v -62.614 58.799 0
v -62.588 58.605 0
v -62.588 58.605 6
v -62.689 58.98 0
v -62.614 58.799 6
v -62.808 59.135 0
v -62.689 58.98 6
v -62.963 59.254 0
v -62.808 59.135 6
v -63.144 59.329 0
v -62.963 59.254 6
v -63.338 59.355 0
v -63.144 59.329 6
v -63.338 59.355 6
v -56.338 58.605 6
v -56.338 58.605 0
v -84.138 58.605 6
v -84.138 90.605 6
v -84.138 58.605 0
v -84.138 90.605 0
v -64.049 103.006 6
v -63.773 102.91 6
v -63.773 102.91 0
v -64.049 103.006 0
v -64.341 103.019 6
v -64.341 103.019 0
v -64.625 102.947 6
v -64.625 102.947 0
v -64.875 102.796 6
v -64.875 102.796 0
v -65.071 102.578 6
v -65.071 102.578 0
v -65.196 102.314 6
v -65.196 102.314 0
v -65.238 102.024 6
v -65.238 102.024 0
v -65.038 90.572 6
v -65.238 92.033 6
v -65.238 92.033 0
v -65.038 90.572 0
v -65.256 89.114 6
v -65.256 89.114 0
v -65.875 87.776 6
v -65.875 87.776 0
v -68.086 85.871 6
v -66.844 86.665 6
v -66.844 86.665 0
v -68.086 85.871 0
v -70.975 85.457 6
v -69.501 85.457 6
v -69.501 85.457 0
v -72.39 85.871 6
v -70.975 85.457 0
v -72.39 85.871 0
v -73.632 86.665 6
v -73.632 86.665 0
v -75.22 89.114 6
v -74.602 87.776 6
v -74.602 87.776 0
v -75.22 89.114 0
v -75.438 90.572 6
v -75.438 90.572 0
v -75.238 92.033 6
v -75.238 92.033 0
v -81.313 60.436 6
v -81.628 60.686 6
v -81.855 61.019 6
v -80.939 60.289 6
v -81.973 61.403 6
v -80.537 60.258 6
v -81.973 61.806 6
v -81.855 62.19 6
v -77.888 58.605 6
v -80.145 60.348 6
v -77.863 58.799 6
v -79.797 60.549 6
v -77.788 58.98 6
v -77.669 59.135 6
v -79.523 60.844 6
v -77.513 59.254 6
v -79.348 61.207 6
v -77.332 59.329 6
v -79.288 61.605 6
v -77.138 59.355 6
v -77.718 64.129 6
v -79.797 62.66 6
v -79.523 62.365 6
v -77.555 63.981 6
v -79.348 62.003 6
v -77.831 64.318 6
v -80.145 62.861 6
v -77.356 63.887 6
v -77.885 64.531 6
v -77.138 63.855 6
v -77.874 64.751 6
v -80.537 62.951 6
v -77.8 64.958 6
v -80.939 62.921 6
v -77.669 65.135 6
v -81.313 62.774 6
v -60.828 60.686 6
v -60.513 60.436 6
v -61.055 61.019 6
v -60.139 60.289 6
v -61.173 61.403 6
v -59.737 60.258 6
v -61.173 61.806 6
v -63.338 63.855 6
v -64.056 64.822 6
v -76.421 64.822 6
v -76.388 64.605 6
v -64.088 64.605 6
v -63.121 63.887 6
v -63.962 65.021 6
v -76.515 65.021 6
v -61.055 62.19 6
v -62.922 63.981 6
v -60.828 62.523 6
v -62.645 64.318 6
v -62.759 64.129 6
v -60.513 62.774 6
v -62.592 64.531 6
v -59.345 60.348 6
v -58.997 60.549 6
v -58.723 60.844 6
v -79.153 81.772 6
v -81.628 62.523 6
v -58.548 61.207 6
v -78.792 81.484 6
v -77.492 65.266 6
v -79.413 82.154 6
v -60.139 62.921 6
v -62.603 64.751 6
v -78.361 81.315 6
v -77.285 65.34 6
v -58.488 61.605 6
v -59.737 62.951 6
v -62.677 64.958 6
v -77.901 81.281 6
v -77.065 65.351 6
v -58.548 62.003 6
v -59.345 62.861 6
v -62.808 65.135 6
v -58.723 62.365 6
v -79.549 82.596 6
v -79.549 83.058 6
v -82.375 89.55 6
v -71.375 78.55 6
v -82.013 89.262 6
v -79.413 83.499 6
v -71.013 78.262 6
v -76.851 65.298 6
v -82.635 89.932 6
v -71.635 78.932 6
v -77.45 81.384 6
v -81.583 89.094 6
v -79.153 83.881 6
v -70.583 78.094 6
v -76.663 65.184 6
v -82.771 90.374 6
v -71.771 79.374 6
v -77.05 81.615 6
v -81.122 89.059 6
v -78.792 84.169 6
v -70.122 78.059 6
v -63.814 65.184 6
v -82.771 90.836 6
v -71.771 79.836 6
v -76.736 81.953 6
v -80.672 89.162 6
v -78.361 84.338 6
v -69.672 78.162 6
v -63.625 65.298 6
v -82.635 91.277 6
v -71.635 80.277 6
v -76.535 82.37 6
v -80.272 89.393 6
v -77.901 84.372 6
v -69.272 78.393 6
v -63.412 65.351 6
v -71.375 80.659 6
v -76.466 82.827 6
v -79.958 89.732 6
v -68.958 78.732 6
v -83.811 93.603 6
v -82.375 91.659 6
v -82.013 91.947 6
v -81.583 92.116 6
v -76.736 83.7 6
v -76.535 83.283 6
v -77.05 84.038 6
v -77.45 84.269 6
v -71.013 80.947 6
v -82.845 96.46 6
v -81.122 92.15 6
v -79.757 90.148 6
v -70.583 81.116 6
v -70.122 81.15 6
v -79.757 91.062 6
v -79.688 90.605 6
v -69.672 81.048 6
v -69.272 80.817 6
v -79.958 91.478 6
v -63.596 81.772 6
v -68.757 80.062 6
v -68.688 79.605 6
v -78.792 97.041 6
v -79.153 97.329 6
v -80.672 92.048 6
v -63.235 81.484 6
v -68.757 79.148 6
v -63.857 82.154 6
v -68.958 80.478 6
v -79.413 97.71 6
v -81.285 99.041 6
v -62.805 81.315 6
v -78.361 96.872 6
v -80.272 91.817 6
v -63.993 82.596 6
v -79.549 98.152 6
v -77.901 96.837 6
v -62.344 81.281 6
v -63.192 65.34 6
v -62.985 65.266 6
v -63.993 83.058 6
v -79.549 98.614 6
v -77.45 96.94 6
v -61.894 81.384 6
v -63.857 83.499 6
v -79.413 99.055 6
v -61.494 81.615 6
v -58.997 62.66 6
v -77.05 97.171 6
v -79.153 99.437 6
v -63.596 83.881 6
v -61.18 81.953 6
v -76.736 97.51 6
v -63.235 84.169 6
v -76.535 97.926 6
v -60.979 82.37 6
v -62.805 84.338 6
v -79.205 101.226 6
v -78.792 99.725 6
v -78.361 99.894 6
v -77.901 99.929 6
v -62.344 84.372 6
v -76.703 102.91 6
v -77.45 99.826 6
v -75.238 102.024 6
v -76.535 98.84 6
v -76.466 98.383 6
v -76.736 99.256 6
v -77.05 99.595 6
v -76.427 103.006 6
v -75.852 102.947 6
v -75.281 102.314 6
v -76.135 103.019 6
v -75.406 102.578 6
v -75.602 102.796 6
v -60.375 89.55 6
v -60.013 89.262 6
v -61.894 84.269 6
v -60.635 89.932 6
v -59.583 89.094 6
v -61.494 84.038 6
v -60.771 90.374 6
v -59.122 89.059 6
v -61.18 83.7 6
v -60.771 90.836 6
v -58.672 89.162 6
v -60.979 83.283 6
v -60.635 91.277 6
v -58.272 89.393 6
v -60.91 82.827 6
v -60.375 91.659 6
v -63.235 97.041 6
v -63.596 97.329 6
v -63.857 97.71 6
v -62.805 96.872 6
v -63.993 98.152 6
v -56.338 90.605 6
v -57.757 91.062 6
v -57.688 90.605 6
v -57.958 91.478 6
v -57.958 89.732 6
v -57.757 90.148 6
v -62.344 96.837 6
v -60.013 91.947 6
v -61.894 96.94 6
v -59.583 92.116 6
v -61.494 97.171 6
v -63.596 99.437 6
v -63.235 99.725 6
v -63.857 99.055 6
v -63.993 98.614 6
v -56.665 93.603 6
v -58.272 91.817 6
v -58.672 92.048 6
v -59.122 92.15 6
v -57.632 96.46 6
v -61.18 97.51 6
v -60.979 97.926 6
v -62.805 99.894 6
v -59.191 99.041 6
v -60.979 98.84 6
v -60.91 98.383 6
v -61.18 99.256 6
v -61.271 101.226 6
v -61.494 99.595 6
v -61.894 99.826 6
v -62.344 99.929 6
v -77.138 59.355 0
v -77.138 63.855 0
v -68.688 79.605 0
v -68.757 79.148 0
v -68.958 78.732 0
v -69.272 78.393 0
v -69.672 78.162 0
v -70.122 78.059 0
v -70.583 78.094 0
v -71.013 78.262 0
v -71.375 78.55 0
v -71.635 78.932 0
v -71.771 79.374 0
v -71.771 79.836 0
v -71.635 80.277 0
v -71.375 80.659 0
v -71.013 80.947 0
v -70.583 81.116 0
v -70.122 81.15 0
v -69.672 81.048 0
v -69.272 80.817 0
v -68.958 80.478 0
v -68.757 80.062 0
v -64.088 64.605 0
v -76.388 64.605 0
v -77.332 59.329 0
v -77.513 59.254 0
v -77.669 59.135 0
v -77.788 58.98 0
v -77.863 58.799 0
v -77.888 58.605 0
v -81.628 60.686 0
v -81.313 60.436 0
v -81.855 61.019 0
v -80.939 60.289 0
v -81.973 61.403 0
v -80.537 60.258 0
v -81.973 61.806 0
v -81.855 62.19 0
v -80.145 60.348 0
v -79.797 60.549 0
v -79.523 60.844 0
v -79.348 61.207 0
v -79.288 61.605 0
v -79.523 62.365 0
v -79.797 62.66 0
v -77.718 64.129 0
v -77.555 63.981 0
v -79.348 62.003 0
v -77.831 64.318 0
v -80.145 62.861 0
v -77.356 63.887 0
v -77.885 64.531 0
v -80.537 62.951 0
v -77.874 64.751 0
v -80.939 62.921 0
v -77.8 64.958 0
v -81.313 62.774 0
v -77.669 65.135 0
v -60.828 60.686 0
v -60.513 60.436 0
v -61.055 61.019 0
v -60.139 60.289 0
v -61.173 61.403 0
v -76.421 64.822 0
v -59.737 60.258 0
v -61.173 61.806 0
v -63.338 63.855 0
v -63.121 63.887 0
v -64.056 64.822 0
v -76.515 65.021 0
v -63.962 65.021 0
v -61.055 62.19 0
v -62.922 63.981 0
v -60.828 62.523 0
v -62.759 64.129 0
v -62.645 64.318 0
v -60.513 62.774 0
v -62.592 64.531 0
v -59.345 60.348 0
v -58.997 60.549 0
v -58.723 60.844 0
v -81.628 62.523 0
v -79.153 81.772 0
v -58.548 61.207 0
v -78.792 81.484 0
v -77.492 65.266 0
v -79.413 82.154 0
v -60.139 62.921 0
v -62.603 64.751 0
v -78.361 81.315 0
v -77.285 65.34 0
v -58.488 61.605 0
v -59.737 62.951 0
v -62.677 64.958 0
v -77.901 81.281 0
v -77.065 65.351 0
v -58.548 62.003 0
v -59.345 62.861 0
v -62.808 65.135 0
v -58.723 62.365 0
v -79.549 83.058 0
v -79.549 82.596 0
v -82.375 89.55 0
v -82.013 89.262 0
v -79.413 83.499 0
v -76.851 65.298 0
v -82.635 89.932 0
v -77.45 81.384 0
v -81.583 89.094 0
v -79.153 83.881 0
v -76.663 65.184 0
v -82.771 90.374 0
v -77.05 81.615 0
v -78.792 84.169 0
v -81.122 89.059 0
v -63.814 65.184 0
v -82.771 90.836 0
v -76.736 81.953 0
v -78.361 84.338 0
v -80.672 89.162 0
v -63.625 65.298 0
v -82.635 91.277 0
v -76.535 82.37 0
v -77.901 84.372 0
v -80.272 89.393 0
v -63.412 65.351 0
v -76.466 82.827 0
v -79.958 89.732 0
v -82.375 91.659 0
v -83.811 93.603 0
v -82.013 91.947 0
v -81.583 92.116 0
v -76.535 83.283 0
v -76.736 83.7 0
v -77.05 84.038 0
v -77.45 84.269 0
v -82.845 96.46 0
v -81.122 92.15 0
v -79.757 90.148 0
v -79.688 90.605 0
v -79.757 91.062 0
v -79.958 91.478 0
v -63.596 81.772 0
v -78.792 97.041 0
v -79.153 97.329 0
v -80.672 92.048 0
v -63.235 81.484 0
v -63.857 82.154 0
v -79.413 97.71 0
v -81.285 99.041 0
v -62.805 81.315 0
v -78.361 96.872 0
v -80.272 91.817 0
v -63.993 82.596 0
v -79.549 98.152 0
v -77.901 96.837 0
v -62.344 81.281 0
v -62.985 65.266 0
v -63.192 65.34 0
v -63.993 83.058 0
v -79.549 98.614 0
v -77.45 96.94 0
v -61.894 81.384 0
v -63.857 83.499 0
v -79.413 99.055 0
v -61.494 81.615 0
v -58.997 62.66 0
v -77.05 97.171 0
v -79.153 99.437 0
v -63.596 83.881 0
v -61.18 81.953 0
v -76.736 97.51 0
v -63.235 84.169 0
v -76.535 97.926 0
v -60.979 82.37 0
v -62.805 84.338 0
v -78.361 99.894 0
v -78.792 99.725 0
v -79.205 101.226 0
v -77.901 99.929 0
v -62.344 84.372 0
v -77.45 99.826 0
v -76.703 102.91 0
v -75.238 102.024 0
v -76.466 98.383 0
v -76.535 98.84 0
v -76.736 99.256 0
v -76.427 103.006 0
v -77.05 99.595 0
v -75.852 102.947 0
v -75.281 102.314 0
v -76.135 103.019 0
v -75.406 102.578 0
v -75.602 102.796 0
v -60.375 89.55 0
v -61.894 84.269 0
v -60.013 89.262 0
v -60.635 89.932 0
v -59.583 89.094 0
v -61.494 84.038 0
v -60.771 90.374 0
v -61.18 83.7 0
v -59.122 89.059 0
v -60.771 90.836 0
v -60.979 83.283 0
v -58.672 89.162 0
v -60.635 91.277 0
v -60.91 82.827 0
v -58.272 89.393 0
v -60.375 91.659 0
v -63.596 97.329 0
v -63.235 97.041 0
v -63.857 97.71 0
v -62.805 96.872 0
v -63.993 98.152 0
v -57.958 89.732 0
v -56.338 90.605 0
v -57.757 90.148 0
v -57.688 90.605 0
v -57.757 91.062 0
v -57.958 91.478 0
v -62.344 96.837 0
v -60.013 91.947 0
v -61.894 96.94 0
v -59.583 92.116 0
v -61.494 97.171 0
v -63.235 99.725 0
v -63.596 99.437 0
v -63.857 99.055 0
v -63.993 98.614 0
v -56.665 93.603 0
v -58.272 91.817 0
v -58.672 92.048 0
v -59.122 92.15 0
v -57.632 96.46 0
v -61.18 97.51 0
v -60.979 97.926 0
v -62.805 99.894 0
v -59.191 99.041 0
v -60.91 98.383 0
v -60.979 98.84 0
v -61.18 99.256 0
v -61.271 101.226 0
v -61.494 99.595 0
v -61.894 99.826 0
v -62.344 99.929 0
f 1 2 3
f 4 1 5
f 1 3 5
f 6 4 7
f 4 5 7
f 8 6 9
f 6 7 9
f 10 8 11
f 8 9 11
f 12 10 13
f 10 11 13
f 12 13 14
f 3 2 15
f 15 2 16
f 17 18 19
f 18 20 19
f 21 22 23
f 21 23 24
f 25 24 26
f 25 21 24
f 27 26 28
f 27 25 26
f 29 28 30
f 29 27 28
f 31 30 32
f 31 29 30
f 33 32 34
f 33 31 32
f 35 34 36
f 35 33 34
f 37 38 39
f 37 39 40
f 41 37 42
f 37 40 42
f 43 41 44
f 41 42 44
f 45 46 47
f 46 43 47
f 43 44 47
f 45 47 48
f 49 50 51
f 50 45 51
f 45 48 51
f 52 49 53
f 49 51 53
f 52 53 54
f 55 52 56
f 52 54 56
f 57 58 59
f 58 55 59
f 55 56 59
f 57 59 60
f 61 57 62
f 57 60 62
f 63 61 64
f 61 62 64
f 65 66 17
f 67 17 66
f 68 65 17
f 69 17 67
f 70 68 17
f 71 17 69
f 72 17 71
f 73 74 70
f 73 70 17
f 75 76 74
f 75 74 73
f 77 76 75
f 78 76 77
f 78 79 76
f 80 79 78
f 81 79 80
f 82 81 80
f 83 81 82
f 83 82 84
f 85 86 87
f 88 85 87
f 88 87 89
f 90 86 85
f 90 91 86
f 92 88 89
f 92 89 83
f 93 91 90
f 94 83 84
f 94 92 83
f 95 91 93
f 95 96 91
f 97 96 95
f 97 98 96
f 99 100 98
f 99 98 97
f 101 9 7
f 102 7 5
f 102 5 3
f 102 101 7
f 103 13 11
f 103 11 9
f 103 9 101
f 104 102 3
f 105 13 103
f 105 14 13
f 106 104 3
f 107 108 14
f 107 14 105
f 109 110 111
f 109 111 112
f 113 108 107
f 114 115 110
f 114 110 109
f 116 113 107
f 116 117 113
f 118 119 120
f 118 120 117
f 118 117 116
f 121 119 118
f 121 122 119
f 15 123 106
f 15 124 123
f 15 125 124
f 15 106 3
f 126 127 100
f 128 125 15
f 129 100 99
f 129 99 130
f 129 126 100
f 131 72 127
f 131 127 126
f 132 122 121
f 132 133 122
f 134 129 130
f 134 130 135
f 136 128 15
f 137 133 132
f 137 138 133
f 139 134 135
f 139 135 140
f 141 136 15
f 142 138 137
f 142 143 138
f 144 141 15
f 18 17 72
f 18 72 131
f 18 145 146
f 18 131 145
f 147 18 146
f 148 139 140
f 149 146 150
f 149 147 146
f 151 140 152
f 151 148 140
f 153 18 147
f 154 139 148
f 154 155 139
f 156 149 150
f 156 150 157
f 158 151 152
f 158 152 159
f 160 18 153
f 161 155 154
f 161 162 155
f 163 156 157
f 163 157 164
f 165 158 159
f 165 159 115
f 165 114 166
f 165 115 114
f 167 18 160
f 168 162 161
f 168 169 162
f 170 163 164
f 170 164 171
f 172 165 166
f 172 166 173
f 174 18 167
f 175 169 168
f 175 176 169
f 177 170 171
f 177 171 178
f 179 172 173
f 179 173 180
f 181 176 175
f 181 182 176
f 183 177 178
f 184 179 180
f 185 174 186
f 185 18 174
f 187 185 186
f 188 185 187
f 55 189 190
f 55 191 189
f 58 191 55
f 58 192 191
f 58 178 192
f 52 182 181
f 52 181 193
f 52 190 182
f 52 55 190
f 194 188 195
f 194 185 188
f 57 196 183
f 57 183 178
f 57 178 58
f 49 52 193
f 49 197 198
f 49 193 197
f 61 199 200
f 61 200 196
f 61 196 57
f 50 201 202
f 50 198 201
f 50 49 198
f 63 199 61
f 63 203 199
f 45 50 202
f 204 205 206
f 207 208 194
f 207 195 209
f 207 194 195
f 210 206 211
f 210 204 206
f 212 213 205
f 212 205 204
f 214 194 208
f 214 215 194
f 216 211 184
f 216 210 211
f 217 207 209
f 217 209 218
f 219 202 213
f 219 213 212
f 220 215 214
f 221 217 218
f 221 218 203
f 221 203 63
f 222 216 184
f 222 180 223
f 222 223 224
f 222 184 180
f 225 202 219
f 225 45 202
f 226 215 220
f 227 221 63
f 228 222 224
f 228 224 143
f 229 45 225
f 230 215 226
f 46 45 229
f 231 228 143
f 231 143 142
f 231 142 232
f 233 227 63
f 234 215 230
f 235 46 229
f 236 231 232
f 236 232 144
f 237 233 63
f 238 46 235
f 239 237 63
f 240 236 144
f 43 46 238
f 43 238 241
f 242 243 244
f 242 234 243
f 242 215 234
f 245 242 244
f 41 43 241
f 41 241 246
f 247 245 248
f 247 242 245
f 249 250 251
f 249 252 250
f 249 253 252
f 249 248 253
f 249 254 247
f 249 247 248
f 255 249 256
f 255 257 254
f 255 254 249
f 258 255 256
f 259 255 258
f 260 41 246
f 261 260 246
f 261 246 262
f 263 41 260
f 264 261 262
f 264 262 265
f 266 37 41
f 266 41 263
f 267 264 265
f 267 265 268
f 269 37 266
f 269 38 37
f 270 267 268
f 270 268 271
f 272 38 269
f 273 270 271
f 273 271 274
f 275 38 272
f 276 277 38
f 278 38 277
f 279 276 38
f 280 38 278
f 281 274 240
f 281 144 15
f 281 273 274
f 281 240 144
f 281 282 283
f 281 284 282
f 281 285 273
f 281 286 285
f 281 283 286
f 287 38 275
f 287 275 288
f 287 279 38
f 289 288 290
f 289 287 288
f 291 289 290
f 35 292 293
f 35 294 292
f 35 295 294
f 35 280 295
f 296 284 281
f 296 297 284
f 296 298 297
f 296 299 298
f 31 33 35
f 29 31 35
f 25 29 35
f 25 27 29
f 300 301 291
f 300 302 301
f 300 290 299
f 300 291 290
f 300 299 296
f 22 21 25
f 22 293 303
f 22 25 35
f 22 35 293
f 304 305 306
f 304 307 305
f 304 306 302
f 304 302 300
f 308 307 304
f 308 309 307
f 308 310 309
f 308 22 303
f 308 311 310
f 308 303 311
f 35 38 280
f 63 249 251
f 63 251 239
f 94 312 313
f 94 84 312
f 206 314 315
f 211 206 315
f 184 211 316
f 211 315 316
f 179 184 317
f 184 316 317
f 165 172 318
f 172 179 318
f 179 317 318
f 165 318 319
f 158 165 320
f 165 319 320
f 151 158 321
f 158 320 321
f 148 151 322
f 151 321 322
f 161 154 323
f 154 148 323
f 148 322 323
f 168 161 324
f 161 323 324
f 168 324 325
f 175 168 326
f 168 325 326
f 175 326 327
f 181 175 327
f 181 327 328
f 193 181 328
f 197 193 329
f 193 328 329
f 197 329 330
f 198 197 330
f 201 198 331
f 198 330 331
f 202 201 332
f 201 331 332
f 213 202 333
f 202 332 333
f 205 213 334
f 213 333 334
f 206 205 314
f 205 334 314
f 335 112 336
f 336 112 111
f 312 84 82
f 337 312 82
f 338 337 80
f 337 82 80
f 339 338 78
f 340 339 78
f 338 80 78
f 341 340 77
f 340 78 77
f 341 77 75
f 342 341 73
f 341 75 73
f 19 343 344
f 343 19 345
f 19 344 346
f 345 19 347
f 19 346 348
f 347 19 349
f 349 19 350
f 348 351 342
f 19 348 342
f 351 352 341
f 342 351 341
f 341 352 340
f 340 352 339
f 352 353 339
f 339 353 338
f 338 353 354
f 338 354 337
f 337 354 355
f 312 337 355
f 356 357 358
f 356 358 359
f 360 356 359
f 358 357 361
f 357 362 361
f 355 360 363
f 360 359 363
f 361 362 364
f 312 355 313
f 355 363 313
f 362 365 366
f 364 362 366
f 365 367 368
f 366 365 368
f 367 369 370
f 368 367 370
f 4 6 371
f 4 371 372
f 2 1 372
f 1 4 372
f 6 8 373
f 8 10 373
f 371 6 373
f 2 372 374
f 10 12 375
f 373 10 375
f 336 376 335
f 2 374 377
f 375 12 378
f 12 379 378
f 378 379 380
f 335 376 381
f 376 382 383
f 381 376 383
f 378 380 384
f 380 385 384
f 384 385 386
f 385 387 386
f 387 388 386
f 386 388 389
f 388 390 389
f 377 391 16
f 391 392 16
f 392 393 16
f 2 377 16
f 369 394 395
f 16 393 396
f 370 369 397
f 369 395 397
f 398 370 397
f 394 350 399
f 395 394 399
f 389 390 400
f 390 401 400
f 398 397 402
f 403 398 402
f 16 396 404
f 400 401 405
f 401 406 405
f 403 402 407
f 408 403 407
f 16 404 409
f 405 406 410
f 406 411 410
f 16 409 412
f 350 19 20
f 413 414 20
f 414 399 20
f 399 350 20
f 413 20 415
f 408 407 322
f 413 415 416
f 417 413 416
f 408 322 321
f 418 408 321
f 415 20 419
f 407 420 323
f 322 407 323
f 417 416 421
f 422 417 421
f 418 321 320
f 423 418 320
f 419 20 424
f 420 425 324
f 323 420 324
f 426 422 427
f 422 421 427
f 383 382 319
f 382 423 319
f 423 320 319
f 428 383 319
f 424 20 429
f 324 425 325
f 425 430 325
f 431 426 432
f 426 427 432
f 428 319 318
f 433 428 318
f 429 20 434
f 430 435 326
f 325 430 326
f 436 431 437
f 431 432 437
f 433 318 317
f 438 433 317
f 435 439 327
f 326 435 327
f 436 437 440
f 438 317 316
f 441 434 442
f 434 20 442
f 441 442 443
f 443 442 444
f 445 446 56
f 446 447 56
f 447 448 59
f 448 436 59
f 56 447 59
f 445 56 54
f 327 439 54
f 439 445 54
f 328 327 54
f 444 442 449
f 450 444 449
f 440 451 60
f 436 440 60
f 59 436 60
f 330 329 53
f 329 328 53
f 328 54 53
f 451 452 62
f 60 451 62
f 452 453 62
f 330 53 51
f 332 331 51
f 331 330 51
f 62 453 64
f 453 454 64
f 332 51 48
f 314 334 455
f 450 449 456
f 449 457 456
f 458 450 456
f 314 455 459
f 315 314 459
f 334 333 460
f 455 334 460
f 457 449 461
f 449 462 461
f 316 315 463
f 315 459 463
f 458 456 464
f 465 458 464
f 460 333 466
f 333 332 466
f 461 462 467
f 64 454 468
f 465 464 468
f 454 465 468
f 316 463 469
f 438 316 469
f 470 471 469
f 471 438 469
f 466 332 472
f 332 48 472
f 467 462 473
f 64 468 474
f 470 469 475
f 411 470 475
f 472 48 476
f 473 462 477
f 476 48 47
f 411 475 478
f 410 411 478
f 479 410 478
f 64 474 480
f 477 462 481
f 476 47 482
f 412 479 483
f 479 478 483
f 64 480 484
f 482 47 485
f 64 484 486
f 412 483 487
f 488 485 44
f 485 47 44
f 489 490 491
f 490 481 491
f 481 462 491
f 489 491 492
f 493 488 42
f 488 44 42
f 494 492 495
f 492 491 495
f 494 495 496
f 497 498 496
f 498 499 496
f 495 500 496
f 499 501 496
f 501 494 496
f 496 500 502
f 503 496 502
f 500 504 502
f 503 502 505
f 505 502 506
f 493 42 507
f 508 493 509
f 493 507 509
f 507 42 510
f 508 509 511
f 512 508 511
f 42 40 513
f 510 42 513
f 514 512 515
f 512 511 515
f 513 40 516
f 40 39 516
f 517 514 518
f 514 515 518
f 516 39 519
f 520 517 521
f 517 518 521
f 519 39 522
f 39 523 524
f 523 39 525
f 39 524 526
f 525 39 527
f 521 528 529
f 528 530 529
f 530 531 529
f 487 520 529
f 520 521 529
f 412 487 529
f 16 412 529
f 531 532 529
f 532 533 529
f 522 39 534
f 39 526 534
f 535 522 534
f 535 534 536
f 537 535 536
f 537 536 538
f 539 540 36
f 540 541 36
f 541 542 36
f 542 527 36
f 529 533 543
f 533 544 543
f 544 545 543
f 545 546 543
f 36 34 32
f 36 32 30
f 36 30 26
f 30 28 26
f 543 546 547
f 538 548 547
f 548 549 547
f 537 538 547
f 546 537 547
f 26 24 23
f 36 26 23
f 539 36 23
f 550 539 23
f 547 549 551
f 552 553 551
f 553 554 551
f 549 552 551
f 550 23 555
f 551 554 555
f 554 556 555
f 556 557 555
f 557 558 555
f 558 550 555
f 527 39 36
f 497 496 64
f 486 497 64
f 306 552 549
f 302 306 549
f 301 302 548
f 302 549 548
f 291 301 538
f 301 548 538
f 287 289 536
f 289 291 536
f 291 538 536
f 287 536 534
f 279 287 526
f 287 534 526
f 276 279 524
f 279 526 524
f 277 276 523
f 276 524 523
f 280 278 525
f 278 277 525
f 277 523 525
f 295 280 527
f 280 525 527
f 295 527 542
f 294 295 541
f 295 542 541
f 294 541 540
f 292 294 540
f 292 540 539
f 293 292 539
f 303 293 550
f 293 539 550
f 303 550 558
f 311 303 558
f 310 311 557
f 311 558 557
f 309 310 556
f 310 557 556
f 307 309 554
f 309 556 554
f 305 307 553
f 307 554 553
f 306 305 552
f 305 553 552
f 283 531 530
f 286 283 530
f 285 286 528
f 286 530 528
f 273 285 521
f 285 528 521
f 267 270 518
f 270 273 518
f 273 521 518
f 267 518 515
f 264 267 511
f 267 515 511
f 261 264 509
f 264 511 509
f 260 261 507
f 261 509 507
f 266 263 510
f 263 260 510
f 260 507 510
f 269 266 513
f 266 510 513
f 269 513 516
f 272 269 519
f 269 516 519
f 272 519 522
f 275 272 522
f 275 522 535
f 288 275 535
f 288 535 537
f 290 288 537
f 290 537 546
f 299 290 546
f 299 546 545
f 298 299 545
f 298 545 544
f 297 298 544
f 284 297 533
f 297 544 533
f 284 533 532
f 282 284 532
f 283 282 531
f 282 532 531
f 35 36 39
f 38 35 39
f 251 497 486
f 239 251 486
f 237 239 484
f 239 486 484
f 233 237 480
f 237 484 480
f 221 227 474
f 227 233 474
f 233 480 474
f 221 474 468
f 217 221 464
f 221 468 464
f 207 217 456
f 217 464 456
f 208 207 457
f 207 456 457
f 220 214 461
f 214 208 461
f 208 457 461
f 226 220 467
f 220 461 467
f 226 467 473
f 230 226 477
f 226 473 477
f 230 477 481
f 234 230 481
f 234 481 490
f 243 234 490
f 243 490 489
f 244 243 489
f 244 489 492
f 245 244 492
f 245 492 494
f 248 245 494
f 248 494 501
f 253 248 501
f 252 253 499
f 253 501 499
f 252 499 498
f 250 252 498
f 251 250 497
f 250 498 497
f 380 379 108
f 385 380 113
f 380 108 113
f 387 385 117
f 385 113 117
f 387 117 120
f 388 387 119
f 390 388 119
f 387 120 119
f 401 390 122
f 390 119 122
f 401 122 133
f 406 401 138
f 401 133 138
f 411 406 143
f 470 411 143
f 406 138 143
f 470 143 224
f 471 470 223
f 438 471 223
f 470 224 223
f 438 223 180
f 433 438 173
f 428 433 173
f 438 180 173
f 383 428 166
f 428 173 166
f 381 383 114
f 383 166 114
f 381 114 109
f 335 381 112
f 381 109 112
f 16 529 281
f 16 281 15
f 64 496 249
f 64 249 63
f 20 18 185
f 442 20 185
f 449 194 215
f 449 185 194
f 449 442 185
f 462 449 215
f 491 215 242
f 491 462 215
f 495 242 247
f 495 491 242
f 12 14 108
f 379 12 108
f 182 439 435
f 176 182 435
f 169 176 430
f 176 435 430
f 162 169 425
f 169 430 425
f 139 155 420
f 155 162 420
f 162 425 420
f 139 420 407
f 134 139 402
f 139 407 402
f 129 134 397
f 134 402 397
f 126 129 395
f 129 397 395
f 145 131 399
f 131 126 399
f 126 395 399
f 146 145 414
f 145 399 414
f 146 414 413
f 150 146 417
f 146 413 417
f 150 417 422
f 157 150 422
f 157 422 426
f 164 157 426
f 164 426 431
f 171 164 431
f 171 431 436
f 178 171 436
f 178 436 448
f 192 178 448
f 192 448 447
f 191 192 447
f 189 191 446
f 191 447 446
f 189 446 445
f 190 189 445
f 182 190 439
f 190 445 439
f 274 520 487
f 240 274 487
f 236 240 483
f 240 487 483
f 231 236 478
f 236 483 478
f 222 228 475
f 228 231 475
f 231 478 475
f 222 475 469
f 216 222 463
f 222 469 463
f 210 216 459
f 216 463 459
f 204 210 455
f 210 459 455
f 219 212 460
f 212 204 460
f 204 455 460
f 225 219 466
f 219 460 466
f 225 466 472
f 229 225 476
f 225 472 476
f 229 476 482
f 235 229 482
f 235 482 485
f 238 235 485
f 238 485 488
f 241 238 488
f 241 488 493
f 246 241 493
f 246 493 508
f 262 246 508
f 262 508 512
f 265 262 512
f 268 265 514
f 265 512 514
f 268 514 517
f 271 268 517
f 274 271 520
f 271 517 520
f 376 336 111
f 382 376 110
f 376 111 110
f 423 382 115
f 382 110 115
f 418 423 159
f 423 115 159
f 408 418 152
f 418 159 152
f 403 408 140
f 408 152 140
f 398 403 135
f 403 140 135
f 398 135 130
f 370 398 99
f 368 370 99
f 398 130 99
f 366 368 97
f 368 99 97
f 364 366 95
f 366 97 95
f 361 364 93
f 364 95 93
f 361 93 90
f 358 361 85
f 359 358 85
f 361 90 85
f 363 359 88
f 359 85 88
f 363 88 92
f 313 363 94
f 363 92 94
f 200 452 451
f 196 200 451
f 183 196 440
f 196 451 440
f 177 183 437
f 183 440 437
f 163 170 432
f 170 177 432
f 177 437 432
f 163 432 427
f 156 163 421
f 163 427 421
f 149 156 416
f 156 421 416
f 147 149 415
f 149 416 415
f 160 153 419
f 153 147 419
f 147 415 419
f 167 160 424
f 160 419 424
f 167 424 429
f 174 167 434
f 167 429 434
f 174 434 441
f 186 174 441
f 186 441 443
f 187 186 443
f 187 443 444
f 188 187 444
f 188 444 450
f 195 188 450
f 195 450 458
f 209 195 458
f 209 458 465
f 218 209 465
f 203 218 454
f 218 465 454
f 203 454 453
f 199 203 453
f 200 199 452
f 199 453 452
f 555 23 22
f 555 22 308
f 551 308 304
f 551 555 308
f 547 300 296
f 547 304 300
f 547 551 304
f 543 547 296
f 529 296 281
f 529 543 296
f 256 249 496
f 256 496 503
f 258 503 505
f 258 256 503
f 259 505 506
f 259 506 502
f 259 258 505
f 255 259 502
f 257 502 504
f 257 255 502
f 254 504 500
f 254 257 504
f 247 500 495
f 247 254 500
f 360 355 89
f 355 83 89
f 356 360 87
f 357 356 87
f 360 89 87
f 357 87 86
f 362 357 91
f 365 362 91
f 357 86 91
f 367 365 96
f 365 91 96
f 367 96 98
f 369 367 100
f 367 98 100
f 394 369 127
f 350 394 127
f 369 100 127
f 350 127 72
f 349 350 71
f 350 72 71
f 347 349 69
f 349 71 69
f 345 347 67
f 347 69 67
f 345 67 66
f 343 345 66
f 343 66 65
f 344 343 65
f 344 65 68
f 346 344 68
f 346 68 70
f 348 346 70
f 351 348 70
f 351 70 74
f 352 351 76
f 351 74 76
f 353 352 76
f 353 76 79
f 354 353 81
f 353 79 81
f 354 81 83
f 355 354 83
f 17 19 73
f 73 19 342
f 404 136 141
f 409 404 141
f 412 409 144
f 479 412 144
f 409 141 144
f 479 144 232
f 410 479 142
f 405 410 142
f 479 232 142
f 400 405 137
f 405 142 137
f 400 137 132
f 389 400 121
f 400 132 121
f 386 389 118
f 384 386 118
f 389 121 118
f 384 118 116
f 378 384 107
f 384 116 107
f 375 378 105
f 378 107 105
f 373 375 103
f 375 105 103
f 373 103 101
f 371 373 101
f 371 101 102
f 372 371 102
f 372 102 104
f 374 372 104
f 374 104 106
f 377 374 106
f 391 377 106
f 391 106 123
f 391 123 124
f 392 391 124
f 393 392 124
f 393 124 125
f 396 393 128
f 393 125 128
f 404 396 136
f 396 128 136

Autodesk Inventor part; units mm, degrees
ref_plane "YZ Plane" through (0, 0, 0) normal (1, 0, 0) x (0, 1, 0)
ref_plane "XZ Plane" through (0, 0, 0) normal (0, 1, 0) x (-1, 0, 0)
ref_plane "작업 평면1" through (0, 0, 0) normal (0, 0, 1) x (1, 0, 0)
sketch "스케치1" plane through (0, 0, 0) normal (0, 0, 1) x (1, 0, 0)
  circle A0 centre (-78.0165, 82.8266) radius 1.55
  circle A1 centre (-62.4602, 82.8266) radius 1.55
  circle A2 centre (-62.4602, 98.3829) radius 1.55
  circle A3 centre (-78.0165, 98.3829) radius 1.55
  circle A4 centre (-70.2383, 101.6047) radius 1.55
  circle A5 centre (-59.2383, 90.6047) radius 1.55
  circle A6 centre (-70.2383, 79.6047) radius 1.55
  circle A7 centre (-81.2383, 90.6047) radius 1.55
  arc A8 (-75.2383, 92.033) -> (-65.2383, 92.033) centre (-70.2383, 90.6047) ccw
  arc A9 (-75.2383, 103.5743) -> (-65.2383, 103.5743) centre (-70.2383, 90.6047) ccw
  line L0 (-65.2383, 95.8047) -> (-65.2383, 103.5743)
  line L1 (-75.2383, 95.8047) -> (-75.2383, 103.5743)
  line L2 (-65.2383, 95.8047) -> (-65.2383, 92.033)
  line L3 (-75.2383, 95.8047) -> (-75.2383, 92.033)
  circle A10 centre (-70.2383, 90.6047) radius 1.5
  circle A11 centre (-62.4602, 98.3829) radius 1.65
  circle A12 centre (-59.2383, 90.6047) radius 1.65
  circle A13 centre (-62.4602, 82.8266) radius 1.65
  circle A14 centre (-70.2383, 79.6047) radius 1.65
  circle A15 centre (-78.0165, 82.8266) radius 1.65
  circle A16 centre (-81.2383, 90.6047) radius 1.65
  circle A17 centre (-78.0165, 98.3829) radius 1.65
  line L4 (-56.3383, 90.6047) -> (-56.3383, 58.6047)
  line L5 (-84.1383, 90.6047) -> (-84.1383, 58.6047)
  arc A18 (-75.2383, 103.5743) -> (-84.1383, 90.6047) centre (-70.2383, 90.6047) ccw
  arc A19 (-56.3383, 90.6047) -> (-65.2383, 103.5743) centre (-70.2383, 90.6047) ccw
  line L6 (-84.1383, 58.6047) -> (-56.3383, 58.6047)
  arc A20 (-56.3383, 90.6047) -> (-65.2383, 103.5743) centre (-70.2383, 90.6047) ccw
  arc A21 (-75.2383, 103.5743) -> (-84.1383, 90.6047) centre (-70.2383, 90.6047) ccw
  point P0 (-52.7957, 62.4635)
  point P1 (-70.2383, 90.6047)
  point P2 (-85.25, 10.6344)
  point P3 (-75.25, 10.6344)
  point P4 (-94.15, -2.3352)
  point P5 (-66.35, -2.3352)
  point P6 (-88.3823, -54.5283)
  point P7 (-48.1823, -54.5283)
  point P8 (-88.3823, -54.5283)
  point P9 (-82.9823, -51.5283)
  point P10 (-53.5823, -51.5283)
  point P11 (-48.1823, -54.5283)
  point P12 (-84.1383, 90.6047)
  point P13 (-56.3383, 90.6047)
  dimension "d0" = 0.1
  dimension "d1" = 0.1
  dimension "d2" = 0.1
  dimension "d3" = 0.1
  dimension "d4" = 0.1
  dimension "d5" = 0.1
  dimension "d6" = 0.1
  dimension "d7" = 32
  dimension "d8" = 32
  dimension "d19" = 27.8
extrude "돌출1" add sketch "스케치1" along normal blind 6 contours A8 L2 L0 A9 L1 L3 | A9 L4 L6 L5 | A11 | A12 | A13 | A14 | A15 | A16 | A17
sketch "스케치2" plane through (0, 0, 6) normal (0, 0, 1) x (1, 0, 0)
  line L0 (-65.2383, 103.5743) -> (-65.2383, 92.033) projected
  arc A0 (-75.2383, 92.033) -> (-65.2383, 92.033) centre (-70.2383, 90.6047) ccw projected
  line L1 (-75.2383, 92.033) -> (-75.2383, 103.5743) projected
  arc A1 (-75.2383, 103.5743) -> (-84.1383, 90.6047) centre (-70.2383, 90.6047) ccw projected
  line L2 (-84.1383, 90.6047) -> (-84.1383, 58.6047) projected
  line L3 (-84.1383, 58.6047) -> (-56.3383, 58.6047) projected
  line L4 (-56.3383, 58.6047) -> (-56.3383, 90.6047) projected
  arc A2 (-56.3383, 90.6047) -> (-65.2383, 103.5743) centre (-70.2383, 90.6047) ccw projected
  line L5 (-84.1383, 58.6047) -> (-56.3383, 58.6047)
  line L6 (-56.3383, 58.6047) -> (-56.3383, 64.6047)
  line L7 (-56.3383, 64.6047) -> (-84.1383, 64.6047)
  line L8 (-84.1383, 64.6047) -> (-84.1383, 58.6047)
  line L9 (-84.1383, 58.6047) -> (-77.1383, 58.6047)
  line L10 (-77.1383, 58.6047) -> (-63.3383, 58.6047)
  line L11 (-63.3383, 58.6047) -> (-56.3383, 58.6047)
  line L12 (-63.3383, 58.6047) -> (-63.3383, 64.6047)
  line L13 (-77.1383, 58.6047) -> (-77.1383, 64.6047)
  point P0 (0, 0)
  point P1 (-56.3383, 61.6047)
  point P2 (-63.3383, 61.6047)
  dimension "d20" = 6
  dimension "d21" = 7
  dimension "d22" = 13.8
  dimension "d23" = 7
extrude "돌출2" cut sketch "스케치2" against normal blind 10 contours L12 L3 L13 L7
sketch "스케치3" plane through (0, 0, 6) normal (0, 0, 1) x (1, 0, 0)
  line L0 (-63.3383, 64.6047) -> (-63.3383, 58.6047) projected
  line L1 (-63.3383, 58.6047) -> (-56.3383, 58.6047) projected
  line L2 (-56.3383, 58.6047) -> (-56.3383, 90.6047) projected
  arc A0 (-56.3383, 90.6047) -> (-65.2383, 103.5743) centre (-70.2383, 90.6047) ccw projected
  line L3 (-65.2383, 103.5743) -> (-65.2383, 92.033) projected
  arc A1 (-75.2383, 92.033) -> (-65.2383, 92.033) centre (-70.2383, 90.6047) ccw projected
  line L4 (-75.2383, 92.033) -> (-75.2383, 103.5743) projected
  arc A2 (-75.2383, 103.5743) -> (-84.1383, 90.6047) centre (-70.2383, 90.6047) ccw projected
  line L5 (-84.1383, 90.6047) -> (-84.1383, 58.6047) projected
  line L6 (-84.1383, 58.6047) -> (-77.1383, 58.6047) projected
  line L7 (-77.1383, 58.6047) -> (-77.1383, 64.6047) projected
  line L8 (-77.1383, 64.6047) -> (-63.3383, 64.6047) projected
  circle A3 centre (-59.8383, 61.6047) radius 1.35
  circle A4 centre (-80.6383, 61.6047) radius 1.35
  point P0 (0, 0)
  dimension "d26" = 2.7
  dimension "d27" = 2.7
  dimension "d30" = 20.8
extrude "돌출3" cut sketch "스케치3" against normal blind 10 contours A3 | A4
fillet "모깎기1" radius 1 2 edges at (-75.2383, 103.5743, 3) (-65.2383, 103.5743, 3)
sketch "스케치5" plane through (0, 0, 6) normal (0, 0, 1) x (1, 0, 0)
  arc A0 (-63.7732, 102.9097) -> (-65.2383, 102.0245) centre (-64.2383, 102.0245) ccw projected
  line L0 (-65.2383, 102.0245) -> (-65.2383, 92.033) projected
  arc A1 (-75.2383, 92.033) -> (-65.2383, 92.033) centre (-70.2383, 90.6047) ccw projected
  line L1 (-75.2383, 92.033) -> (-75.2383, 102.0245) projected
  arc A2 (-75.2383, 102.0245) -> (-76.7034, 102.9097) centre (-76.2383, 102.0245) ccw projected
  arc A3 (-76.7034, 102.9097) -> (-84.1383, 90.6047) centre (-70.2383, 90.6047) ccw projected
  line L2 (-84.1383, 90.6047) -> (-84.1383, 58.6047) projected
  line L3 (-84.1383, 58.6047) -> (-77.1383, 58.6047) projected
  line L4 (-77.1383, 58.6047) -> (-77.1383, 64.6047) projected
  line L5 (-77.1383, 64.6047) -> (-63.3383, 64.6047) projected
  line L6 (-63.3383, 64.6047) -> (-63.3383, 58.6047) projected
  line L7 (-63.3383, 58.6047) -> (-56.3383, 58.6047) projected
  line L8 (-56.3383, 58.6047) -> (-56.3383, 90.6047) projected
  arc A4 (-56.3383, 90.6047) -> (-63.7732, 102.9097) centre (-70.2383, 90.6047) ccw projected
  circle A5 centre (-59.8383, 61.6047) radius 1.35 projected
  circle A6 centre (-80.6383, 61.6047) radius 1.35 projected
  circle A7 centre (-62.4602, 98.3829) radius 1.55 projected
  circle A8 centre (-59.2383, 90.6047) radius 1.55 projected
  circle A9 centre (-62.4602, 82.8266) radius 1.55 projected
  circle A10 centre (-70.2383, 79.6047) radius 1.55 projected
  circle A11 centre (-78.0165, 82.8266) radius 1.55 projected
  circle A12 centre (-81.2383, 90.6047) radius 1.55 projected
  circle A13 centre (-78.0165, 98.3829) radius 1.55 projected
  circle A14 centre (-77.1383, 58.6047) radius 0.75
  line L9 (-77.1383, 58.6047) -> (-77.1383, 64.6047) projected
  circle A15 centre (-77.1383, 64.6047) radius 0.75
  circle A16 centre (-63.3383, 64.6047) radius 0.75
  circle A17 centre (-63.3383, 58.6047) radius 0.75
  point P0 (0, 0)
  point P1 (-77.1383, 59.3547)
  point P2 (-77.8883, 58.6047)
  dimension "d32" = 1.5
  dimension "d33" = 1.5
  dimension "d34" = 1.5
  dimension "d35" = 1.5
extrude "돌출4" cut sketch "스케치5" against normal blind 10 contours A17 L6 L7 | L7 L6 A17 | A16 L5 L6 | L6 L5 A16 | A15 L4 L5 | L5 L4 A15 | A14 L4 L3 picked at (-77.3024, 59.0737)
properties part number "frame_knee_to_pelvis1" material "PMMA 플라스틱"
